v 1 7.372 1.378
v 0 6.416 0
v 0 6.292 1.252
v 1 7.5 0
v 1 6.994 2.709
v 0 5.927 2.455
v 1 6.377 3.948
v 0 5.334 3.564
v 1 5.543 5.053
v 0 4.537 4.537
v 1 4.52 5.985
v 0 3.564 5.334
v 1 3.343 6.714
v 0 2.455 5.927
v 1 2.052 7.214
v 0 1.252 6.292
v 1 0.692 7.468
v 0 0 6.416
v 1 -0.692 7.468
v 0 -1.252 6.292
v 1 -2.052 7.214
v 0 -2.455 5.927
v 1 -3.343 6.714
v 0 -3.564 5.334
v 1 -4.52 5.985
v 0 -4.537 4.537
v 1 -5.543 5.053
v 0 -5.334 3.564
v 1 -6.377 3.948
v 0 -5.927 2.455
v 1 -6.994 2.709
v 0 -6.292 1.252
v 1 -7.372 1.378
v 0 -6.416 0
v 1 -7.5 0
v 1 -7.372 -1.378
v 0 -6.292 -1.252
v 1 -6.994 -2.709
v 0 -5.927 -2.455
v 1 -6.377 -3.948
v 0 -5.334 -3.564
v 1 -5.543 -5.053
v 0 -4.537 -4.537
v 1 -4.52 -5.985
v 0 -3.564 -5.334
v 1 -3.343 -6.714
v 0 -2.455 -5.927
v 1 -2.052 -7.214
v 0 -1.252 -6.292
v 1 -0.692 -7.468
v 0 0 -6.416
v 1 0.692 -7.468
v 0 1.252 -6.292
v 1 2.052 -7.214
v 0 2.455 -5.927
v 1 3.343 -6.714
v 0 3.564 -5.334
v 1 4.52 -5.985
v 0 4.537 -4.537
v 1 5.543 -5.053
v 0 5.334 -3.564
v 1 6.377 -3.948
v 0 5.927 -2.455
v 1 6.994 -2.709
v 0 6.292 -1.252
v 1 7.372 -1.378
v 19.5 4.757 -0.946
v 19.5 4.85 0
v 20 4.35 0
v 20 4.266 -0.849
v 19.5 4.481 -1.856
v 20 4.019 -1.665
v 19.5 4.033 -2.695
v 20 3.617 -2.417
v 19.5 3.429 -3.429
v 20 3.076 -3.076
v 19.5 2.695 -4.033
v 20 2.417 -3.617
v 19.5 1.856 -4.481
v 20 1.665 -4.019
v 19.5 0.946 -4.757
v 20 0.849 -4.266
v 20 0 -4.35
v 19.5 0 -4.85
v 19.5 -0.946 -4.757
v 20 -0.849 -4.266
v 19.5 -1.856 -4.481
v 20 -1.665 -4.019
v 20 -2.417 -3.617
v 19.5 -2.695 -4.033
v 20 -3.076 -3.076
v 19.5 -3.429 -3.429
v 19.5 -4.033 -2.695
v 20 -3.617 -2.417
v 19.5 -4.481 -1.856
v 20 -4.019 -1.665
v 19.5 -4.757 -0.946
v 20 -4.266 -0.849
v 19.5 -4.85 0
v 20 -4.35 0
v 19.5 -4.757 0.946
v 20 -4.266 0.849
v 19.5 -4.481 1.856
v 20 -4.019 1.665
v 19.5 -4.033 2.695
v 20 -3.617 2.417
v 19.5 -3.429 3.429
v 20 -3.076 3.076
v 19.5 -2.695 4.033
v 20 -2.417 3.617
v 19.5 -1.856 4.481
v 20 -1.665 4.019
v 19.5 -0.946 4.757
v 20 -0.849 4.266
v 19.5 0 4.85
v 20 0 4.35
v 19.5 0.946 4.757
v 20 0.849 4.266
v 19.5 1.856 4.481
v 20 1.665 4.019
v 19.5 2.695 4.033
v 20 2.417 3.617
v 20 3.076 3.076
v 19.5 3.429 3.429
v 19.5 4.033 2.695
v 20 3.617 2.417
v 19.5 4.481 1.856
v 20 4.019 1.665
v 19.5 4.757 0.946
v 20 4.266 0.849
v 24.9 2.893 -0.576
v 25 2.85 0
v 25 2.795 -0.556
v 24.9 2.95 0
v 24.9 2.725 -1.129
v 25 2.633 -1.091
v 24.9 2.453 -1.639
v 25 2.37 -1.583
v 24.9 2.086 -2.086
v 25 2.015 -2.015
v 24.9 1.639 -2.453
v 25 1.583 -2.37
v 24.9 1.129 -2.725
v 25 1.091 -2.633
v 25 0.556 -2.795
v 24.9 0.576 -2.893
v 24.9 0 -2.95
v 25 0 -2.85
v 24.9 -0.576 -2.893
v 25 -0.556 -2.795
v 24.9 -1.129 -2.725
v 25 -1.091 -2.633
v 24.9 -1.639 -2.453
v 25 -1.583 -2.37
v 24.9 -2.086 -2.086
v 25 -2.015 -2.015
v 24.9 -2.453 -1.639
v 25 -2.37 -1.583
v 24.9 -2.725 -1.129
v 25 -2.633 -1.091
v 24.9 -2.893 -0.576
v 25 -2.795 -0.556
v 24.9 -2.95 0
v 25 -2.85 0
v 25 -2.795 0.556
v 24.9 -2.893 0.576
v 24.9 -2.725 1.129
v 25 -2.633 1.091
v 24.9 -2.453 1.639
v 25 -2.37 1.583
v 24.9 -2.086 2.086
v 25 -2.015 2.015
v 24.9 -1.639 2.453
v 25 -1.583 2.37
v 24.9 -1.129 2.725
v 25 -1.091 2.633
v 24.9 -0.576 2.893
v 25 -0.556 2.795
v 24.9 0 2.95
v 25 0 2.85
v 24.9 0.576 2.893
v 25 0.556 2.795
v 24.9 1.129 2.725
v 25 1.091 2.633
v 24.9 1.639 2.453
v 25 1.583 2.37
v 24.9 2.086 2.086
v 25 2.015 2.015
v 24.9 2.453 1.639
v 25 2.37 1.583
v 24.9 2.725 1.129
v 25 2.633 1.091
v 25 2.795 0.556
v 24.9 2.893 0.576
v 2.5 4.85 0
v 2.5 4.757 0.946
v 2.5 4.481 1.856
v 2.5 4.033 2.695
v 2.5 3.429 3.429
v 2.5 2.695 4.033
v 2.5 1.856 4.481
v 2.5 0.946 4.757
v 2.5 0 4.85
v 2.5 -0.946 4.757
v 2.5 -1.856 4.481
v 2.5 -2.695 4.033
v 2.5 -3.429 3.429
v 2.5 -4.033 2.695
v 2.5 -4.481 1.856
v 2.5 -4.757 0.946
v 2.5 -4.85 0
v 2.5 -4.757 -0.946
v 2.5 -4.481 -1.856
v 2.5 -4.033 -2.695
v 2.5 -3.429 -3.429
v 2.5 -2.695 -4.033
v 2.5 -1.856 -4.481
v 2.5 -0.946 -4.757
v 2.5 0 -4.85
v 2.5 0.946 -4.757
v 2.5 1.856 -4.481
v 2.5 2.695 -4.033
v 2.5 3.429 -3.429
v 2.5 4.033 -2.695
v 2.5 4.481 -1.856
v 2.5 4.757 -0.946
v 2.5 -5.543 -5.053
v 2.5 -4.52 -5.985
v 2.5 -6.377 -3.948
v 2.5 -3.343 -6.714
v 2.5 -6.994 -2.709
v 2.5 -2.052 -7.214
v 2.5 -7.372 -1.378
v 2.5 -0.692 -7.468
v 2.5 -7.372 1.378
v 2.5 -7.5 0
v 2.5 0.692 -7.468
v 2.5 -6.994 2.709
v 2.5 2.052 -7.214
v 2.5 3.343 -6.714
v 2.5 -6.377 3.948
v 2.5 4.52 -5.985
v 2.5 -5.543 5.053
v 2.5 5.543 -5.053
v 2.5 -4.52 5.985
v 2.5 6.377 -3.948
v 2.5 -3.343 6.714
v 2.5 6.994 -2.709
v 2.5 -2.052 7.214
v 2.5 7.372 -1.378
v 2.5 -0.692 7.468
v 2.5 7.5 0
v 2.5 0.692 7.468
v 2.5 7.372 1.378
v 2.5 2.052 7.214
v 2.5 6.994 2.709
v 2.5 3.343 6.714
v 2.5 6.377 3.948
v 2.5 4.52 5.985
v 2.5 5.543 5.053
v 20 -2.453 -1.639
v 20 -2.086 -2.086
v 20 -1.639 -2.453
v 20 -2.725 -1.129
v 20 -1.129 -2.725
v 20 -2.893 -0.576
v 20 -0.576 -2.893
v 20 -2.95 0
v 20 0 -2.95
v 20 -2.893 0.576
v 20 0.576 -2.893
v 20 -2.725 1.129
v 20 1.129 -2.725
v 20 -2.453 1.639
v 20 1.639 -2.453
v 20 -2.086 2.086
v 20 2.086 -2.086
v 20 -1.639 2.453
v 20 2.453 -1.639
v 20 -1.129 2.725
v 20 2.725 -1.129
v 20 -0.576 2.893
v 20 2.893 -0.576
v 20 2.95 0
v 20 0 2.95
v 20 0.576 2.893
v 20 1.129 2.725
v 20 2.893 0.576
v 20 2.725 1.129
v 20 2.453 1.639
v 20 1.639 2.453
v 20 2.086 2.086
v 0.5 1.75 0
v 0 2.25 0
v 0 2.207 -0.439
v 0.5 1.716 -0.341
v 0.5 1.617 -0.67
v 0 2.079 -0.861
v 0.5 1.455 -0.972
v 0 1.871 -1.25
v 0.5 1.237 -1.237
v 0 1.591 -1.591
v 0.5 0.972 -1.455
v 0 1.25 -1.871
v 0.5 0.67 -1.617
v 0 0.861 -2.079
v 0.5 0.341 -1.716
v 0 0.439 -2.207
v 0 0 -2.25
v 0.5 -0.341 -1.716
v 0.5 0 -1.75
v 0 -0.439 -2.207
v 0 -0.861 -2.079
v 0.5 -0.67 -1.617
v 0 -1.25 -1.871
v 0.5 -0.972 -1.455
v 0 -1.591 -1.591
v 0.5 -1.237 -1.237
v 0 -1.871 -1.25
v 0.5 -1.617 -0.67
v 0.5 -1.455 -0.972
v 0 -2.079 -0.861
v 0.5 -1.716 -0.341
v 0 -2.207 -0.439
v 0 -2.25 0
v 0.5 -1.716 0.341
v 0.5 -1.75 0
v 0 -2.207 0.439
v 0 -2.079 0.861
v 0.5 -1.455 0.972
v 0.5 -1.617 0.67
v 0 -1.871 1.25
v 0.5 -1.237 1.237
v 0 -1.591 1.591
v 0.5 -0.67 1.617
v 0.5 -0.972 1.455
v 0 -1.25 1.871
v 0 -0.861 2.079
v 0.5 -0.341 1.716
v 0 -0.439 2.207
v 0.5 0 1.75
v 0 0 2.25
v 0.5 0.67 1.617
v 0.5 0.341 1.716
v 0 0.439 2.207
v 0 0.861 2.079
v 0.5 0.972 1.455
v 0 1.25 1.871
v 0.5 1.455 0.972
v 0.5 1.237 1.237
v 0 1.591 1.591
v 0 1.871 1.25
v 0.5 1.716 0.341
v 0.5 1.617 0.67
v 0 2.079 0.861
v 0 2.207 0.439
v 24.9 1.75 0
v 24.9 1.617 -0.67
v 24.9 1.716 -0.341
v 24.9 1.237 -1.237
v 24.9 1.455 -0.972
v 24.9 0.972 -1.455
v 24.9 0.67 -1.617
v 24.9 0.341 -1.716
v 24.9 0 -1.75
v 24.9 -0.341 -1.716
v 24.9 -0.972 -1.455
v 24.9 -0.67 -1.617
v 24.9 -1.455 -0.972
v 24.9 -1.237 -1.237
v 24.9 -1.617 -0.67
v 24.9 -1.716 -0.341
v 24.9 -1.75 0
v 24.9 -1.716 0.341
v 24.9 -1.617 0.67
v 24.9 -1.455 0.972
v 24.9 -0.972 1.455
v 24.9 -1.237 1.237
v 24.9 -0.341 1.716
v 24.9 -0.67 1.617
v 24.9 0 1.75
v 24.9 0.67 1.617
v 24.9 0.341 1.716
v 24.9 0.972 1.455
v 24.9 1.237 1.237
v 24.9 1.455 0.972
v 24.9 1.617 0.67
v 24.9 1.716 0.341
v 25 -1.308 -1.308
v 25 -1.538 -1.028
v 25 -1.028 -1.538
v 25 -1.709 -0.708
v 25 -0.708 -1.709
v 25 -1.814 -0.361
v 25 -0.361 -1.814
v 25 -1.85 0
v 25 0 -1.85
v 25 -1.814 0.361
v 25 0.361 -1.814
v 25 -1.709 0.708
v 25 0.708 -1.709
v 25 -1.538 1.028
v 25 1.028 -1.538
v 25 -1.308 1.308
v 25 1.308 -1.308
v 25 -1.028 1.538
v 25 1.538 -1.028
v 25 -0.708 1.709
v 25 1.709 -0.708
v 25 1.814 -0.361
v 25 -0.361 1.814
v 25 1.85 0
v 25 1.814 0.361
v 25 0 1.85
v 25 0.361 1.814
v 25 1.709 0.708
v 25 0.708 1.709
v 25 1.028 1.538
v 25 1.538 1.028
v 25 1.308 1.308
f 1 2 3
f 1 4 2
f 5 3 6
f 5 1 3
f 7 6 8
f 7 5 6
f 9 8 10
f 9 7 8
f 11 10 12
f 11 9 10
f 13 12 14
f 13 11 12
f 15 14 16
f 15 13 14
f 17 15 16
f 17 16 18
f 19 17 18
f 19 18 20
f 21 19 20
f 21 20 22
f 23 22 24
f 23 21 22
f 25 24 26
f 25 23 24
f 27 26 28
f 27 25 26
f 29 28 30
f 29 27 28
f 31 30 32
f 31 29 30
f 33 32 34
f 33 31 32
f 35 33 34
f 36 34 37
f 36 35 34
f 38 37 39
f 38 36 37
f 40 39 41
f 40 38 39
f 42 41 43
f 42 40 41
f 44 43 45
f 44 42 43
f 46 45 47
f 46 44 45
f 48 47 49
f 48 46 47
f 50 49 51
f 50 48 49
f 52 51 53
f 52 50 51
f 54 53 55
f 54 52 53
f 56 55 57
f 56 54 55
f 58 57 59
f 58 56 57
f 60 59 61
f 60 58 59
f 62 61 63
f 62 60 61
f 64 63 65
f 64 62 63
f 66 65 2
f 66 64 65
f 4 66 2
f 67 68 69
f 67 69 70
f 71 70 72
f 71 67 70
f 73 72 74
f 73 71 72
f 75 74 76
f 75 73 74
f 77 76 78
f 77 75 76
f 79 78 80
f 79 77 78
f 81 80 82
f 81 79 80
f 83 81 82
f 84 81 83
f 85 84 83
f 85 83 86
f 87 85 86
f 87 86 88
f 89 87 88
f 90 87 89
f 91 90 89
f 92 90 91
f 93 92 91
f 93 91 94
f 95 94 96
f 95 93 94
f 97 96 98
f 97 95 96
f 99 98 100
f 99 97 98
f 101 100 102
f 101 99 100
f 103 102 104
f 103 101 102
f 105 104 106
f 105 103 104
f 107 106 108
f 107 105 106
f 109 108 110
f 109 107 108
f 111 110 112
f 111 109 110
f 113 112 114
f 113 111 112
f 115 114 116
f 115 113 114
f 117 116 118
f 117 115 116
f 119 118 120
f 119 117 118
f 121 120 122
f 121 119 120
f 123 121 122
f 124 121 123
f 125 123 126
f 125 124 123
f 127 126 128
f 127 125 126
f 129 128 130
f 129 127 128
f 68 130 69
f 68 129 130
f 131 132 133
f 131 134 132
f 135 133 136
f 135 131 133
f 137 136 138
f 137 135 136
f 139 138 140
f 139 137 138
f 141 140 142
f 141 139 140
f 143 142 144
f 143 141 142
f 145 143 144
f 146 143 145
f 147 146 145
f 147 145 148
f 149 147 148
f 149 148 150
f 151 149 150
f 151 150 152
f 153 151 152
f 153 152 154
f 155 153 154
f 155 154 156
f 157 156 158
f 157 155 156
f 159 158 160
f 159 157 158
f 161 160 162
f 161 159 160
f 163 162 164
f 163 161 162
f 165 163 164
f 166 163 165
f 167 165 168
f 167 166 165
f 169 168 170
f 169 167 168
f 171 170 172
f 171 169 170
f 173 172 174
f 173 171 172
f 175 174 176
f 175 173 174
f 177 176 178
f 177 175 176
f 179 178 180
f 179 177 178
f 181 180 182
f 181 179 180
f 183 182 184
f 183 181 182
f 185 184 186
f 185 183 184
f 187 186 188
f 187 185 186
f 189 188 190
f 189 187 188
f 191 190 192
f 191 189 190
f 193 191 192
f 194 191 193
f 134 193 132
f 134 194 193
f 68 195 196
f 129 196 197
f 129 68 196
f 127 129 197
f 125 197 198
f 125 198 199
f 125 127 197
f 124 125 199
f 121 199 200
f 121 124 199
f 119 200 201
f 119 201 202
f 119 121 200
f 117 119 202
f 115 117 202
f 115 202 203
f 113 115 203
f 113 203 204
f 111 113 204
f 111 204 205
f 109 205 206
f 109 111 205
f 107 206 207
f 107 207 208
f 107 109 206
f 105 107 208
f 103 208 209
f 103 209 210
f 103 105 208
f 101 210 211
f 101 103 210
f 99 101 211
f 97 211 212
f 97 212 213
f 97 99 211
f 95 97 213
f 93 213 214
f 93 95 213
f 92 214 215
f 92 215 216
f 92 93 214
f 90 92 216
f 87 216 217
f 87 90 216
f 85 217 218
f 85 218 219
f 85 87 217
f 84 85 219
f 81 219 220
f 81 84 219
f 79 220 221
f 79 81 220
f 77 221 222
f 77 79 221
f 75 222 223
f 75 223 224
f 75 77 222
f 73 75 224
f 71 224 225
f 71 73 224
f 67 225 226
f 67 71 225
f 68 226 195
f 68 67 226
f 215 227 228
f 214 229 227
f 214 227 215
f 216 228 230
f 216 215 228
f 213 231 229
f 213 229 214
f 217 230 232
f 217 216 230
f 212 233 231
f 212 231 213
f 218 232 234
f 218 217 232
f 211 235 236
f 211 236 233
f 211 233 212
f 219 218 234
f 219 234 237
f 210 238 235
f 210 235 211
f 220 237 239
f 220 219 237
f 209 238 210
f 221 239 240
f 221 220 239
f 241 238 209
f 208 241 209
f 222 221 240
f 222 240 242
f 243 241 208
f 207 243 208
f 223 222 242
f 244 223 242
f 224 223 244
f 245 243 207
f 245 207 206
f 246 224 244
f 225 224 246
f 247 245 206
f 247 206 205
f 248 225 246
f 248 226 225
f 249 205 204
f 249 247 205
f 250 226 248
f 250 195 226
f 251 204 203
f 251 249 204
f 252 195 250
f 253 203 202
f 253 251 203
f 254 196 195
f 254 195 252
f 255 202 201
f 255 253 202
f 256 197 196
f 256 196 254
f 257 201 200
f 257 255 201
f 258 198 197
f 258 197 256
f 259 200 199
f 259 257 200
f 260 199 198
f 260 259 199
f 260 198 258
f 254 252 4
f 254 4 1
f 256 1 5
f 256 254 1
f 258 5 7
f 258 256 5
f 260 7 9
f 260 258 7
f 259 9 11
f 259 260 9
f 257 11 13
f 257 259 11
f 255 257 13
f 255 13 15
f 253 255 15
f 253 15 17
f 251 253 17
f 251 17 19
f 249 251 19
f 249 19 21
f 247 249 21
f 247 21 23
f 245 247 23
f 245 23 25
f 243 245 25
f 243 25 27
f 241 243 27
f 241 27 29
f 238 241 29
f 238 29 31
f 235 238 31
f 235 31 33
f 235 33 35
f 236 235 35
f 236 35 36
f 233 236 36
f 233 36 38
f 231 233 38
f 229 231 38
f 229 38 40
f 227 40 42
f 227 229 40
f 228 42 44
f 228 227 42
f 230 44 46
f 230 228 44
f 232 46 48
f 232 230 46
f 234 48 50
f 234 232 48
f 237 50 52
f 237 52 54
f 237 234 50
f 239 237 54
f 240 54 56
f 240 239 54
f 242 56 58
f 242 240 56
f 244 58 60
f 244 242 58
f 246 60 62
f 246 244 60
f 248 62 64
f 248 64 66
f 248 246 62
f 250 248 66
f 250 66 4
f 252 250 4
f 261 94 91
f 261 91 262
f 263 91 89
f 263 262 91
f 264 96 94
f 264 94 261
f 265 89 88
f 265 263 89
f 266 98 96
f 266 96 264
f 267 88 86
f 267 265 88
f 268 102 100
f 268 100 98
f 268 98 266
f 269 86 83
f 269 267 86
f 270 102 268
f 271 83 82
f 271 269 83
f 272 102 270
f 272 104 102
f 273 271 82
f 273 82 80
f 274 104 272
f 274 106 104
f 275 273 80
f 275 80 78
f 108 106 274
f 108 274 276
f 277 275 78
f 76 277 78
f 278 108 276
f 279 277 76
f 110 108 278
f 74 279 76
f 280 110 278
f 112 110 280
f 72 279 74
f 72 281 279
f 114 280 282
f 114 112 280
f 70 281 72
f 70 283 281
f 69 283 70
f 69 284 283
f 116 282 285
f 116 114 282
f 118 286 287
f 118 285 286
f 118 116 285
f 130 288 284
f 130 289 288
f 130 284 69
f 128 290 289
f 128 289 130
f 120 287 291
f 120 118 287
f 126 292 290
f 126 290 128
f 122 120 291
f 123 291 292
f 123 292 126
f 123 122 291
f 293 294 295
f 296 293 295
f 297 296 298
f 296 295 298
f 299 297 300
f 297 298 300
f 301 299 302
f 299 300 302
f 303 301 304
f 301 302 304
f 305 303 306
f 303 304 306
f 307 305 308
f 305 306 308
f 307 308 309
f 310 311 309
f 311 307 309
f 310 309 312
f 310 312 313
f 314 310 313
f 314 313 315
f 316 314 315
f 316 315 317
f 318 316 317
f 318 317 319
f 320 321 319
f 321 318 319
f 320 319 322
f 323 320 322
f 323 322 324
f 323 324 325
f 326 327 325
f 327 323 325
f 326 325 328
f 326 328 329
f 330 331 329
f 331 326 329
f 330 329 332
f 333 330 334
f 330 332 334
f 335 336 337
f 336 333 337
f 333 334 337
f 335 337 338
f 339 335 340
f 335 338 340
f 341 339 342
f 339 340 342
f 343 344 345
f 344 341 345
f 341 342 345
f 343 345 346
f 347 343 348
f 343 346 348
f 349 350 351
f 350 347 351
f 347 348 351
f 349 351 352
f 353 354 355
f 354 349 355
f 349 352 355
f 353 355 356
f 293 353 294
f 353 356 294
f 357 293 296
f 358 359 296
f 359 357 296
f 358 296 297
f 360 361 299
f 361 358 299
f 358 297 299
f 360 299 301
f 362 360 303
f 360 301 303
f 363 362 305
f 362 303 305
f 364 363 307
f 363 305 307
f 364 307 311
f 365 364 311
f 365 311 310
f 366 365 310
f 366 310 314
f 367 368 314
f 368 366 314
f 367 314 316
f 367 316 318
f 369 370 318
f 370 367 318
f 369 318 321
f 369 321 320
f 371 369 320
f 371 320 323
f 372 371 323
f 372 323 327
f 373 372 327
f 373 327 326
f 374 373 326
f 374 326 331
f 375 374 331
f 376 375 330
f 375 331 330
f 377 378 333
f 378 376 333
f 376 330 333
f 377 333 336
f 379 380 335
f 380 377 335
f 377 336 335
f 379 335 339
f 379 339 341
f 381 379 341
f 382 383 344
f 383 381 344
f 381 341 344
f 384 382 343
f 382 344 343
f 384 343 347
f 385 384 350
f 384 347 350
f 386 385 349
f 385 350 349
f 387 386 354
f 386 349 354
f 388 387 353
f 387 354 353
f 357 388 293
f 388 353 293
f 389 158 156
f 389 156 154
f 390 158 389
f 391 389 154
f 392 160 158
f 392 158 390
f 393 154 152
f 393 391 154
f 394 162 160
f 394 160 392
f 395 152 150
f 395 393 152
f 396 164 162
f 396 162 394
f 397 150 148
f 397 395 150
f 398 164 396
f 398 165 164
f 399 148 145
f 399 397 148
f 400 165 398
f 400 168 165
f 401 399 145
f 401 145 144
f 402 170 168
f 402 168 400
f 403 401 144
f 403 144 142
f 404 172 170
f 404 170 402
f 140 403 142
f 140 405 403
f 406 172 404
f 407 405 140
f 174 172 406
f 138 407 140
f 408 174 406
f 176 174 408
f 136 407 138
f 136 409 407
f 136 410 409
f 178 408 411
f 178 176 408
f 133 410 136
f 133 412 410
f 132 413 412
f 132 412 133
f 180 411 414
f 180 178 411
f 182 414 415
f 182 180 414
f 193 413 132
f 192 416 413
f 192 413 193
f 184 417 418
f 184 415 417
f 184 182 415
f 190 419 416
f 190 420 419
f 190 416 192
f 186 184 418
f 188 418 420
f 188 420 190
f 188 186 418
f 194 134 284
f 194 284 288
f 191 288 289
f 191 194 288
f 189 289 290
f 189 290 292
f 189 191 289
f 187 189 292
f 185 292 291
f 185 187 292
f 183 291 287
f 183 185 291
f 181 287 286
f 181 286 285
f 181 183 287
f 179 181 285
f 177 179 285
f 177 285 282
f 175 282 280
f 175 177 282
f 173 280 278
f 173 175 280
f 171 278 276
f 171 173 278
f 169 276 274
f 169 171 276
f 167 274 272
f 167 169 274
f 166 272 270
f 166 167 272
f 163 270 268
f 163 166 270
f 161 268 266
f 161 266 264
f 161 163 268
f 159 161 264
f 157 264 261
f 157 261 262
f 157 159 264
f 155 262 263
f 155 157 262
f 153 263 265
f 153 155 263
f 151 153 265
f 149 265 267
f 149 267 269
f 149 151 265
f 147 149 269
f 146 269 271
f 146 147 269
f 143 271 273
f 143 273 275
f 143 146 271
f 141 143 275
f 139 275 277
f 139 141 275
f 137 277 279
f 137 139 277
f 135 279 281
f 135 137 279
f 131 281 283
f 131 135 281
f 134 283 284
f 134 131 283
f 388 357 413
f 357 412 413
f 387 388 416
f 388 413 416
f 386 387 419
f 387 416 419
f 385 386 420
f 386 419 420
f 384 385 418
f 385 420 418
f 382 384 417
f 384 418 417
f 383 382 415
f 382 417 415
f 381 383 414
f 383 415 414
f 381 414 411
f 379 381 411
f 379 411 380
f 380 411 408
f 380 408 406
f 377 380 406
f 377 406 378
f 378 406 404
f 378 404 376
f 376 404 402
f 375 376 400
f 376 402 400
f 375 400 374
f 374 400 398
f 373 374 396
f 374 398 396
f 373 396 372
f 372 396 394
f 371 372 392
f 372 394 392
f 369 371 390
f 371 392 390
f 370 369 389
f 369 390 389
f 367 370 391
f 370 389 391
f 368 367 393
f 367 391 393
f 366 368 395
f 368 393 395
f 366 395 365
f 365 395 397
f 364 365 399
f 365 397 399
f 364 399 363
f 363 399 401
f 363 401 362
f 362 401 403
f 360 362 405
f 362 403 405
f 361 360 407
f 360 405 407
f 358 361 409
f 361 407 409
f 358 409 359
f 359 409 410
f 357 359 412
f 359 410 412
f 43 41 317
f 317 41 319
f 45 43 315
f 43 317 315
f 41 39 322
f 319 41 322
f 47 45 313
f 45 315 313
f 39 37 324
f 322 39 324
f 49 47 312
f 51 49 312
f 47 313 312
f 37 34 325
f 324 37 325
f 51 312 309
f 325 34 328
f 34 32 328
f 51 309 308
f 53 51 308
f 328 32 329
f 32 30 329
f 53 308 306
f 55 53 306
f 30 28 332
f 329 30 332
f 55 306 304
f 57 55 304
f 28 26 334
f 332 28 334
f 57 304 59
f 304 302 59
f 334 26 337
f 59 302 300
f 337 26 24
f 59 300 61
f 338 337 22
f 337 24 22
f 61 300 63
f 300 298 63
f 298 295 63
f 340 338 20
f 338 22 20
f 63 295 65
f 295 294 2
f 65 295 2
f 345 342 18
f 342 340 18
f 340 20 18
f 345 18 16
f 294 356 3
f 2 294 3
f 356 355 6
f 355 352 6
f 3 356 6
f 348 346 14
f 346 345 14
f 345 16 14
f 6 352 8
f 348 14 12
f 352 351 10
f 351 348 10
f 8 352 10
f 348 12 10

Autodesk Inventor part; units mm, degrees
ref_plane "YZ Plane" through (0, 0, 0) normal (1, 0, 0) x (0, 1, 0)
ref_plane "XZ Plane" through (0, 0, 0) normal (0, 1, 0) x (-1, 0, 0)
ref_plane "XY Plane" through (0, 0, 0) normal (0, 0, 1) x (1, 0, 0)
sketch "Эскиз1" plane through (0, 0, 0) normal (0, 0, 1) x (1, 0, 0)
  line L0 (0, 0) -> (0, 6.4157)
  line L1 (2.5, 4.85) -> (20, 4.85)
  line L2 (20, 4.85) -> (20, 2.95)
  line L3 (20, 2.95) -> (25, 2.95)
  line L4 (25, 2.95) -> (25, 1.75)
  line L5 (25, 1.75) -> (0, 1.75)
  line L6 (0, 0) -> (17.5335, 0) construction
  line L7 (0, 6.4157) -> (1, 7.5)
  line L8 (1, 7.5) -> (2.5, 7.5)
  line L9 (2.5, 7.5) -> (2.5, 4.85)
  dimension "d0" = 5.9
  dimension "d2" = 3.5
  dimension "d3" = 9.7
  dimension "d12" = 15
  dimension "d18" = 1
  dimension "d19" = 5
  dimension "d21" = 2.5
  dimension "d22" = 17.5
revolve "Вращение1" add sketch "Эскиз1" angle 360 about axis through (0, 0, 0) along (1, 0, 0)
chamfer "Фаска1" distance 0.5 angle 45 2 edges at (20, -4.85, 0) (0, -1.75, 0)
chamfer "Фаска2" distance 0.1 angle 45 2 edges at (25, -2.95, 0) (25, -1.75, 0)
properties part number "Ось односторонняя"
